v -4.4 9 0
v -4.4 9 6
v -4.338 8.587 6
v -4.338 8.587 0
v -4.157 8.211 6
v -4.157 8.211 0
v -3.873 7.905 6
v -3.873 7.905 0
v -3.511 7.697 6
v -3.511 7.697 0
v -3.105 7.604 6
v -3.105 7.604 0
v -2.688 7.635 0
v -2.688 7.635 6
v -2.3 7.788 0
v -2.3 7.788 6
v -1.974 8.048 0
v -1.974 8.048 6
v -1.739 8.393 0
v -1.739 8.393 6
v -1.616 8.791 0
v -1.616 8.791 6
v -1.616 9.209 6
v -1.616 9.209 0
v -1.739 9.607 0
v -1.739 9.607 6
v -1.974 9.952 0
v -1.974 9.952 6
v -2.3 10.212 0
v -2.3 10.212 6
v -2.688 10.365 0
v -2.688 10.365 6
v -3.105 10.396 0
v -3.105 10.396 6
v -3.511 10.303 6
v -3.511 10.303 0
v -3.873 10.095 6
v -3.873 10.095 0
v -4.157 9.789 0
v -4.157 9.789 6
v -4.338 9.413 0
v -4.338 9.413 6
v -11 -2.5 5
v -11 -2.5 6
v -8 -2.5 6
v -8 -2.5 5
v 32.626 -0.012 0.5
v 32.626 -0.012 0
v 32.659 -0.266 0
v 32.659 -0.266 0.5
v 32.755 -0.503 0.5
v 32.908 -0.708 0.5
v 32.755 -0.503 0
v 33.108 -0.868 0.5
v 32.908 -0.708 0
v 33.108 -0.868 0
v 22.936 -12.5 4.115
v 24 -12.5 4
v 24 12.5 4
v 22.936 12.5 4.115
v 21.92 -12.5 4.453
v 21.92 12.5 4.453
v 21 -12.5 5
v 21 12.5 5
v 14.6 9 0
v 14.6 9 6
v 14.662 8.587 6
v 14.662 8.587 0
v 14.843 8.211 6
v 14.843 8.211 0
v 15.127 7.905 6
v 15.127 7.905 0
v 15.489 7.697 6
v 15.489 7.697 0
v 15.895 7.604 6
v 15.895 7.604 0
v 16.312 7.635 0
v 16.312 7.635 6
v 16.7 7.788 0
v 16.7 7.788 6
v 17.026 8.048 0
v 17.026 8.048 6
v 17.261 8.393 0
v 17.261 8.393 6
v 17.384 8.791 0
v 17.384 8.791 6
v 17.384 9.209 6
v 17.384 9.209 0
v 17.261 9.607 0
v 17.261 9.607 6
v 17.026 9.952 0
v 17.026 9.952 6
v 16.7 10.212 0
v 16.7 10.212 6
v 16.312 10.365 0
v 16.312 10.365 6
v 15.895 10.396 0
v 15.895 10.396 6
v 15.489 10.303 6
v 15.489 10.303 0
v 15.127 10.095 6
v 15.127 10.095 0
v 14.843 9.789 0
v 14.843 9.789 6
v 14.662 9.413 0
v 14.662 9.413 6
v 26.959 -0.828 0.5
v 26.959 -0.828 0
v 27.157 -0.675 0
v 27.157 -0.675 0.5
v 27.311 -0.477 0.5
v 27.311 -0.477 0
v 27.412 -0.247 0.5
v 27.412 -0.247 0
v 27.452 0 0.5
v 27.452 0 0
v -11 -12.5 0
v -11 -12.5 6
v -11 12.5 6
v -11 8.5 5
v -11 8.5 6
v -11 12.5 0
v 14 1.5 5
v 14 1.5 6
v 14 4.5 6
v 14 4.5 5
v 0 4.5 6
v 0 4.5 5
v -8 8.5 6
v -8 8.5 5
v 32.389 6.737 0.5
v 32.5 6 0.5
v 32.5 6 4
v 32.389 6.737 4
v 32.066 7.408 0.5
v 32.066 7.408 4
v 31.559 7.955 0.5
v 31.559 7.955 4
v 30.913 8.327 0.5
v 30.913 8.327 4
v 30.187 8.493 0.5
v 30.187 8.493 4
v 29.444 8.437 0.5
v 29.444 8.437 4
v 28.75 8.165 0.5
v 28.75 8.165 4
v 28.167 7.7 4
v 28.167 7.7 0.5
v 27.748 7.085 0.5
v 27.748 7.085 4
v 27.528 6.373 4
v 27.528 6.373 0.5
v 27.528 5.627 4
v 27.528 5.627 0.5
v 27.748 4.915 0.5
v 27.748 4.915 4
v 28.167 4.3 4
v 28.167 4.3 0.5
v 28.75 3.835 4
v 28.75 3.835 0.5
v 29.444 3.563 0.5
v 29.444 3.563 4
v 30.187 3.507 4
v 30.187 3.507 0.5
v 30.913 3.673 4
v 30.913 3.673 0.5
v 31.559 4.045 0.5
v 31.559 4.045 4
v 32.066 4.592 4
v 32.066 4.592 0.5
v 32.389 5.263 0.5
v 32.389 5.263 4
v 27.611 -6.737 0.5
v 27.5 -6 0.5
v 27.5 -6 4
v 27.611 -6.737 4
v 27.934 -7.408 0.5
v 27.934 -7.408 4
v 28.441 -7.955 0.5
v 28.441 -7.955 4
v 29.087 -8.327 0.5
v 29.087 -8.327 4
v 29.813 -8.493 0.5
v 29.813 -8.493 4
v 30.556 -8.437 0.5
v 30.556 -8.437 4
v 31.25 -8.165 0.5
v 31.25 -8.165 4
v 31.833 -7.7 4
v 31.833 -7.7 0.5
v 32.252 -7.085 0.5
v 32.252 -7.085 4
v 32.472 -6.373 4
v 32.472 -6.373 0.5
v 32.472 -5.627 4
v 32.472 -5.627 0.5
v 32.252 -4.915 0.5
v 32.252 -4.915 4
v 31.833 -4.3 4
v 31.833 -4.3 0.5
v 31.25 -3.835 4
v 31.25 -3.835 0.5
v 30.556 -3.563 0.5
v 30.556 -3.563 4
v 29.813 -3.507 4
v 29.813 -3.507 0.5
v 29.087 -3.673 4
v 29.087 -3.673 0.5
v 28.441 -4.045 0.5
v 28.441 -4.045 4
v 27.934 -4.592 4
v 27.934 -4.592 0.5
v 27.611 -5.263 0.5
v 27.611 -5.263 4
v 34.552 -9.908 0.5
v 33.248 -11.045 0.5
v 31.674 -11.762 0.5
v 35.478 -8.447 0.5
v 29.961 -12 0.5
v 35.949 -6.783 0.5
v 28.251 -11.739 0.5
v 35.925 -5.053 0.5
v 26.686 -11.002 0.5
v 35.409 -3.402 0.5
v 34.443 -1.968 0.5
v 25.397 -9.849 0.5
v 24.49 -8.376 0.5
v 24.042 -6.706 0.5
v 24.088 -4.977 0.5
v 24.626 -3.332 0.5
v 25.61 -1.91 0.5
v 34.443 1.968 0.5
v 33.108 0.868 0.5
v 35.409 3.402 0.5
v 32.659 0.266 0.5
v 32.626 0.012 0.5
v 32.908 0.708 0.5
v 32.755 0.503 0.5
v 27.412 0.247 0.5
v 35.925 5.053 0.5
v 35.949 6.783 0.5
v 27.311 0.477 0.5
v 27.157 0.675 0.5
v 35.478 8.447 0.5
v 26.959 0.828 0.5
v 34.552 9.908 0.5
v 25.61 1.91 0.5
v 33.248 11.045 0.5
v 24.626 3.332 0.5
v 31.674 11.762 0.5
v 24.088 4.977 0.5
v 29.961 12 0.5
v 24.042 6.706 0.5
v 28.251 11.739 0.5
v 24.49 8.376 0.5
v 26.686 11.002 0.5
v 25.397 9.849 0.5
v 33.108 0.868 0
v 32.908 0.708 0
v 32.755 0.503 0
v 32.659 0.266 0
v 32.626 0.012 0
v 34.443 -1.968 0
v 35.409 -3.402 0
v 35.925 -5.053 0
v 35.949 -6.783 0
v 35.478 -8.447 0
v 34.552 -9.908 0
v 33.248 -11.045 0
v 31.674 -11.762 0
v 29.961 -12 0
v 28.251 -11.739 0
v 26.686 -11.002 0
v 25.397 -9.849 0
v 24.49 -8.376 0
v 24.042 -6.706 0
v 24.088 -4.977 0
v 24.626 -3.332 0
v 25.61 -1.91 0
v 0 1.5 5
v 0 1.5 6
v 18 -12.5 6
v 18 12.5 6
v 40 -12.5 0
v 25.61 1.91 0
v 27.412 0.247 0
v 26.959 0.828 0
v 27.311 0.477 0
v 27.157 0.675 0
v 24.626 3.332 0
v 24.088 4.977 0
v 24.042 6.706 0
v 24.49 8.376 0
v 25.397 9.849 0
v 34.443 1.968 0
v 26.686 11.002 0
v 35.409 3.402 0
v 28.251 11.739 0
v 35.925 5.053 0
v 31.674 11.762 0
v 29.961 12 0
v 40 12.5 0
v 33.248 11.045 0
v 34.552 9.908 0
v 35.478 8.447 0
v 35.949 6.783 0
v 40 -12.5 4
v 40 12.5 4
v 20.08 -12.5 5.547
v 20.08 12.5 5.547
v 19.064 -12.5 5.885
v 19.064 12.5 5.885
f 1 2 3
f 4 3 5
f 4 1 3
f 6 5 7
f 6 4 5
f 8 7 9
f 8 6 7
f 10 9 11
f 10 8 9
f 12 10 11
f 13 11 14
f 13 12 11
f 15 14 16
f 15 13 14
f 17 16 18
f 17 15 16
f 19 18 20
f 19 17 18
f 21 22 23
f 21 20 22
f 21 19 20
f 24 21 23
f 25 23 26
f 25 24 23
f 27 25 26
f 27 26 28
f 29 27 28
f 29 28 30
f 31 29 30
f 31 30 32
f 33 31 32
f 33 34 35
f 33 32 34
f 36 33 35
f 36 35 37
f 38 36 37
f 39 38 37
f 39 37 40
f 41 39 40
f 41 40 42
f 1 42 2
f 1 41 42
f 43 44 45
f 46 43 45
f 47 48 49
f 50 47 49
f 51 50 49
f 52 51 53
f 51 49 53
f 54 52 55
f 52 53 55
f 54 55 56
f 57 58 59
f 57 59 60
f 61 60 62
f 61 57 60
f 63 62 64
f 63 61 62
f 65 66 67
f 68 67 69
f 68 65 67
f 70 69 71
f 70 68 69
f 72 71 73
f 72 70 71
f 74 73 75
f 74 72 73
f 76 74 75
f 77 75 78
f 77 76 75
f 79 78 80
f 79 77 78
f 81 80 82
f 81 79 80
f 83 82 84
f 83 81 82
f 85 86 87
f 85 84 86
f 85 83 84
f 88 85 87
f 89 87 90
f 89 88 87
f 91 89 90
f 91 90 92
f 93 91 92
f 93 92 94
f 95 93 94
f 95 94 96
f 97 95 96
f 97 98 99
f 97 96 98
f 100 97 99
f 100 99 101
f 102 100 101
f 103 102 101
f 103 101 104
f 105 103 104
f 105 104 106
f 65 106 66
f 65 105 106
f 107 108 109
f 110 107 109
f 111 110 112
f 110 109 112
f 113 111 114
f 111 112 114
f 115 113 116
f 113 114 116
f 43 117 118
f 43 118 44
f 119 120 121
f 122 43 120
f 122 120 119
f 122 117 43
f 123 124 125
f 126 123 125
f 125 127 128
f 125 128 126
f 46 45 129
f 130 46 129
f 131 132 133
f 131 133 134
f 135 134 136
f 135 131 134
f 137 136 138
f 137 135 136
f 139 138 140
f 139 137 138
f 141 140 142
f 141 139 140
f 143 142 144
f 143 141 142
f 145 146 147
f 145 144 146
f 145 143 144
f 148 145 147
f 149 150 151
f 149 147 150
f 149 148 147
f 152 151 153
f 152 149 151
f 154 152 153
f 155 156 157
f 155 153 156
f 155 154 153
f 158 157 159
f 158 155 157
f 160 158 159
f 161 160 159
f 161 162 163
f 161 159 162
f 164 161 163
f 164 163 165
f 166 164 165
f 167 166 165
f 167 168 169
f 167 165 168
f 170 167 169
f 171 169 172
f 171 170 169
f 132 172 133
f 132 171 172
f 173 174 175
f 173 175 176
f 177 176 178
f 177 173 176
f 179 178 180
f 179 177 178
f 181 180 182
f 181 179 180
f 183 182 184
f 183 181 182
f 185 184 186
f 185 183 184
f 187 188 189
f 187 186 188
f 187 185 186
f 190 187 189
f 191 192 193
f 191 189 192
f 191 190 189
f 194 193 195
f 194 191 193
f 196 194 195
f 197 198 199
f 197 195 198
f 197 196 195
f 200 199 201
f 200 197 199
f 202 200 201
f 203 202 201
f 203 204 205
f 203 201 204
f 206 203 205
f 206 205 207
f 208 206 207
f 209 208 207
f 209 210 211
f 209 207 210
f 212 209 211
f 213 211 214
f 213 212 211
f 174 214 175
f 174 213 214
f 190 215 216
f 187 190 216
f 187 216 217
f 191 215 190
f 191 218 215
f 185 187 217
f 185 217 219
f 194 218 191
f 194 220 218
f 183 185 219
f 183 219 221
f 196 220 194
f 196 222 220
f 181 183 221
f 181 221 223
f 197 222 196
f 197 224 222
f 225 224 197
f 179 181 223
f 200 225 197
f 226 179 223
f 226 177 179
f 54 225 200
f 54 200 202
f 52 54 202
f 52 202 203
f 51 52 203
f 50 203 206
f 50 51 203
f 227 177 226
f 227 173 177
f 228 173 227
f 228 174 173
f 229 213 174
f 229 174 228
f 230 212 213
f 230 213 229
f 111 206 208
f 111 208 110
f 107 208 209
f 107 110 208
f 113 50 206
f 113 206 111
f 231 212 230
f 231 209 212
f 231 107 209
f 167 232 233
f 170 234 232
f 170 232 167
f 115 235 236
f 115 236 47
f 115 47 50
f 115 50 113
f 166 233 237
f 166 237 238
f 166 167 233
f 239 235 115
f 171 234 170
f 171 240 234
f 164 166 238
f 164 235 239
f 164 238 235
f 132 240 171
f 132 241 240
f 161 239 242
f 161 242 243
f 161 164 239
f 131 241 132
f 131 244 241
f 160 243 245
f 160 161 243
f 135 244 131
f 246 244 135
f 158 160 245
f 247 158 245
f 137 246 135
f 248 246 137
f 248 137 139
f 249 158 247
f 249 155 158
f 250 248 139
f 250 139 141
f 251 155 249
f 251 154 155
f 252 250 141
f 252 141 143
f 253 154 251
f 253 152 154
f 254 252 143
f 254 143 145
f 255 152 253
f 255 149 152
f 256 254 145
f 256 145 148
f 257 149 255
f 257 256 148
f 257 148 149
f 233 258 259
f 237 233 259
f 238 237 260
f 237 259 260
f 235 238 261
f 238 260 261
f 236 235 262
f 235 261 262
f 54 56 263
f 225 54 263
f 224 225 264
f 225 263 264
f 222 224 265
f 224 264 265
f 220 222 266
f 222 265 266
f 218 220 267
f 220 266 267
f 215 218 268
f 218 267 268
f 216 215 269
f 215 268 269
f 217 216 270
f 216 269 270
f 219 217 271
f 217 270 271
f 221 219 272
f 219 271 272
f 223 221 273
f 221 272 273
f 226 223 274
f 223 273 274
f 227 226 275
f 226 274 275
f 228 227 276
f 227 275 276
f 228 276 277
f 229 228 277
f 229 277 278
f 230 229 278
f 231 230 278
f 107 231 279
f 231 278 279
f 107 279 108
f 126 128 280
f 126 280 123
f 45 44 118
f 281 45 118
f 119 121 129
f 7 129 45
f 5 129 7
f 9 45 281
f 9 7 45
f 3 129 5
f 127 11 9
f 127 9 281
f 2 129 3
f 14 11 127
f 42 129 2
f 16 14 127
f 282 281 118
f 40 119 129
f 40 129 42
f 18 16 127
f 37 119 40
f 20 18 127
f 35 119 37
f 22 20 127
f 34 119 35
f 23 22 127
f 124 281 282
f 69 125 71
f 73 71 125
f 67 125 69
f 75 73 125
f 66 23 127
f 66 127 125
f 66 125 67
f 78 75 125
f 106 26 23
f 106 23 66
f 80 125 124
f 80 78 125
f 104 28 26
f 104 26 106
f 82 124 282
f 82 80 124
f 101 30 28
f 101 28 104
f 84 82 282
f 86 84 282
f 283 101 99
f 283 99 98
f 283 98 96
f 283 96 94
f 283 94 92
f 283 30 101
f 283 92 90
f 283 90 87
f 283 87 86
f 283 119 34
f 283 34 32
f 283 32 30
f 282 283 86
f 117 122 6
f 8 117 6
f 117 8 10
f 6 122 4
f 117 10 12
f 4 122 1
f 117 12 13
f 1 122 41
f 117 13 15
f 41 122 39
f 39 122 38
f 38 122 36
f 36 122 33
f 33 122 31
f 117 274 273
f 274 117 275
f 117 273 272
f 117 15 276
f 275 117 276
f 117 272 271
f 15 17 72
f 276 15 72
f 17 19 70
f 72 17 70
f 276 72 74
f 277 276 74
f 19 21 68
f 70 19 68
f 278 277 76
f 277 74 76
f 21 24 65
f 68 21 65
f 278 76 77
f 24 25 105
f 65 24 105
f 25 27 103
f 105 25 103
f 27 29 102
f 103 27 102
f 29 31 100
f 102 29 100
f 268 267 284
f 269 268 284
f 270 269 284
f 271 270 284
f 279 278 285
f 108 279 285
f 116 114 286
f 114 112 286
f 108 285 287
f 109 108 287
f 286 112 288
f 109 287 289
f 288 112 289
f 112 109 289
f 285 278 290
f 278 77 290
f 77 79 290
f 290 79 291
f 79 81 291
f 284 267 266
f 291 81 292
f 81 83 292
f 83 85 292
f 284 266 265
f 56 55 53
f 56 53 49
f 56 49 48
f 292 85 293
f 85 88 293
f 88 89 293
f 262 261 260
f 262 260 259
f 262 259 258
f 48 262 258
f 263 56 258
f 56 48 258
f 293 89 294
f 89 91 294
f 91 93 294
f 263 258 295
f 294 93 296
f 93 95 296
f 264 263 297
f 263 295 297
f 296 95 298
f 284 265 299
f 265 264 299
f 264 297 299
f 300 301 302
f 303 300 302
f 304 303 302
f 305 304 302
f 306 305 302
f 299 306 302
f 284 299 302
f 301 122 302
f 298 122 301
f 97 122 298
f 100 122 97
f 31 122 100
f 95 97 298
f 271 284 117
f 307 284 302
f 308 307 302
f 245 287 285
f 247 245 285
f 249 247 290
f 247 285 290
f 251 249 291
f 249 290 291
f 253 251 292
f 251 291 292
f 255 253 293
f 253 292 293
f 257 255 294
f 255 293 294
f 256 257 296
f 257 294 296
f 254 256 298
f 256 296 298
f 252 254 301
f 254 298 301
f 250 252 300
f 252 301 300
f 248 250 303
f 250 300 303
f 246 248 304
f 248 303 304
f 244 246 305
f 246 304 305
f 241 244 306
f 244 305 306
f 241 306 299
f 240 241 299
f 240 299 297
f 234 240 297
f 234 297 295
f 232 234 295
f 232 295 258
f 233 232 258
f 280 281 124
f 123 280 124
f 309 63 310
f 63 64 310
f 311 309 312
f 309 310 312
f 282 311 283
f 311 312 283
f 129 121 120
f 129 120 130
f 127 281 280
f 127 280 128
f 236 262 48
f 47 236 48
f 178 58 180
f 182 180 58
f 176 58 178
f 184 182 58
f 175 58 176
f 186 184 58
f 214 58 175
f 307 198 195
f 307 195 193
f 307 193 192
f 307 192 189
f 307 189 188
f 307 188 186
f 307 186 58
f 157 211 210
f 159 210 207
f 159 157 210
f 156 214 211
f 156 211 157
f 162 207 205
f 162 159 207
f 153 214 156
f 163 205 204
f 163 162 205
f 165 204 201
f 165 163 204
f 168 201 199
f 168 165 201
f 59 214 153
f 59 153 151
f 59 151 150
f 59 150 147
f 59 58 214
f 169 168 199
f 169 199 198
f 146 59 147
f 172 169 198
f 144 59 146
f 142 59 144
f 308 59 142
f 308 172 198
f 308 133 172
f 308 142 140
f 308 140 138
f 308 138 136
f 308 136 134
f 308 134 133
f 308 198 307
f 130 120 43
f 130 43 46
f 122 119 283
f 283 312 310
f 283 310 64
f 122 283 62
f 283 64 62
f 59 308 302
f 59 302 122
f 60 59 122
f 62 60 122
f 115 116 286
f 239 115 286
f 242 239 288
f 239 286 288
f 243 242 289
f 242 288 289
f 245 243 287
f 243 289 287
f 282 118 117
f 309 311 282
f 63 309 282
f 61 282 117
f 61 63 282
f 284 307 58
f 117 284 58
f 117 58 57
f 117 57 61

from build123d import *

# Parameters (mm, degrees)
SKETCH1_W           = 40
SKETCH1_H           = 25
BOSS_EXTRUDE1_DEPTH = 6
CUT_EXTRUDE1_START  = 6
SKETCH3_W           = 14
SKETCH3_H           = 3
SKETCH3_W_2         = 3
SKETCH3_H_2         = 11
CUT_EXTRUDE1_DEPTH  = 1
SKETCH4_R           = 1.4
CUT_EXTRUDE2_DEPTH  = 11
SKETCH7_W           = 9
SKETCH7_H           = 25
CUT_EXTRUDE5_DEPTH  = 21
SKETCH8_W           = 20
SKETCH8_H           = 25
BOSS_EXTRUDE2_DEPTH = 4
SKETCH9_R           = 2.5
CUT_EXTRUDE6_DEPTH  = 43.334973721
CUT_EXTRUDE7_DEPTH  = 0.5
FILLET3_R           = 1
FILLET4_R           = 5
FILLET5_R           = 5


with BuildPart() as part:
    # Sketch1 → Boss-Extrude1 (new body)
    with BuildSketch(Plane.XY):
        Rectangle(SKETCH1_W, SKETCH1_H)
    extrude(amount=BOSS_EXTRUDE1_DEPTH)

    # Sketch3 → Cut-Extrude1 (cut)
    with BuildSketch(Plane.XY.offset(CUT_EXTRUDE1_START)):
        with Locations((7, 3)):
            Rectangle(SKETCH3_W, SKETCH3_H)
        with Locations((-9.5, 3)):
            Rectangle(SKETCH3_W_2, SKETCH3_H_2)
    extrude(amount=-CUT_EXTRUDE1_DEPTH, mode=Mode.SUBTRACT)

    # Sketch4 → Cut-Extrude2 (cut)
    with BuildSketch(Plane.XY):
        with Locations(Location((16, 9, 0), (0, 0, 180))):
            Circle(SKETCH4_R)
        with Locations(Location((-3, 9, 0), (0, 0, 180))):
            Circle(SKETCH4_R)
    extrude(amount=CUT_EXTRUDE2_DEPTH, mode=Mode.SUBTRACT)

    # Sketch7 → Cut-Extrude5 (cut)
    with BuildSketch(Plane.XY):
        with Locations((-15.5, 0)):
            Rectangle(SKETCH7_W, SKETCH7_H)
    extrude(amount=CUT_EXTRUDE5_DEPTH, mode=Mode.SUBTRACT)

    # Sketch8 → Boss-Extrude2 (add)
    with BuildSketch(Plane.XY):
        with Locations((30, 0)):
            Rectangle(SKETCH8_W, SKETCH8_H)
    extrude(amount=BOSS_EXTRUDE2_DEPTH)

    # Sketch9 → Cut-Extrude6 (cut, through all)
    with BuildSketch(Plane.XY):
        with Locations((30, 6)):
            Circle(SKETCH9_R)
        with Locations(Location((30, -6, 0), (0, 0, 180))):
            Circle(SKETCH9_R)
    extrude(amount=CUT_EXTRUDE6_DEPTH, mode=Mode.SUBTRACT)

    # Sketch10 → Cut-Extrude7 (cut)
    with BuildSketch(Plane.XY):
        with BuildLine():
            Line((27.452141011, -0.567835185), (27.452141011, 0.567835185))
            ThreePointArc((27.452141011, 0.567835185), (29.956756767, 11.999844167), (32.625893719, 0.605124452))
            Line((32.625893719, 0.605124452), (32.625893719, 0.058283872))
            Line((32.625893719, 0.058283872), (32.625893719, -0.605124452))
            ThreePointArc((32.625893719, -0.605124452), (29.956756767, -11.999844167), (27.452141011, -0.567835185))
        make_face()
    extrude(amount=CUT_EXTRUDE7_DEPTH, mode=Mode.SUBTRACT)

    # Fillet3
    # the kernel refuses this fillet: 1 mm, written as the material it takes off along each edge
    with BuildSketch(Plane(origin=(27.452141011, -0.567835185, -1.505321413), x_dir=(-0.8846564558137137, -0.466243450556808, 0), z_dir=(0, 0, 1))) as fillet3_piece_1:
        with BuildLine():
            CenterArc((0.603917956, -0.998920373), FILLET3_R, 92.662646755, 59.546627489)
            Line((-0.2807385, -0.532676923), (0, 0))
            ThreePointArc((0, 0), (0.278731364, -0.006477761), (0.557462728, 0))
        make_face()
    extrude(amount=2.005321413, mode=Mode.SUBTRACT)
    with BuildSketch(Plane(origin=(27.452141011, 0.567835185, -1.505321413), x_dir=(-0.8846564558137143, 0.46624345055680716, 0), z_dir=(0, 0, 1))) as fillet3_piece_2:
        with BuildLine():
            CenterArc((0.603917956, 0.998920373), FILLET3_R, 207.790725756, 59.546627489)
            Line((-0.2807385, 0.532676923), (0, 0))
            ThreePointArc((0, 0), (0.278731364, 0.006477761), (0.557462728, 0))
        make_face()
    extrude(amount=2.005321413, mode=Mode.SUBTRACT)
    with BuildSketch(Plane(origin=(32.625893719, -0.605124452, -1.482132829), x_dir=(0.8781869817379448, -0.4783174940413514, 0), z_dir=(0, 0, 1))) as fillet3_piece_3:
        with BuildLine():
            CenterArc((0.594614958, 0.998953396), FILLET3_R, 208.575572443, 58.80282617)
            Line((-0.283572024, 0.520635902), (0, 0))
            ThreePointArc((0, 0), (0.274437673, 0.006279622), (0.548875345, 0))
        make_face()
    extrude(amount=1.982132829, mode=Mode.SUBTRACT)
    with BuildSketch(Plane(origin=(32.625893719, 0.605124452, -1.482132829), x_dir=(0, -1, 0), z_dir=(0, 0, 1))) as fillet3_piece_4:
        with BuildLine():
            CenterArc((0.592853132, 1), FILLET3_R, 211.19717383, 58.80282617)
            ThreePointArc((-0.26253668, 0.482015183), (-0.125753657, 0.244011245), (0, 0))
            Line((0, 0), (0.592853132, 0))
        make_face()
    extrude(amount=1.982132829, mode=Mode.SUBTRACT)

    # Fillet4
    # the kernel refuses this fillet: 5 mm, written as the material it adds along each edge
    with BuildSketch(Plane(origin=(20, -12.5, 4), x_dir=(0, 0, 1), z_dir=(0, 1, 0))) as fillet4_piece_1:
        with BuildLine():
            CenterArc((5, 4), FILLET4_R, 180, 53.130102354)
            Line((0, 4), (-0.1, 4))
            Line((-0.1, 4), (-0.1, 0))
            Line((-0.1, 0), (0, -0.1))
            ThreePointArc((0, -0.1), (1, -0.1), (1.94, -0.08))
            Line((1.94, -0.08), (2, 0))
        make_face()
    extrude(amount=25)

    # Fillet5
    fillet5_edges = [part.edges().sort_by_distance(p)[0] for p in [
        (20, 0, 6),
    ]]
    fillet(fillet5_edges, radius=FILLET5_R)


solid = part.part
